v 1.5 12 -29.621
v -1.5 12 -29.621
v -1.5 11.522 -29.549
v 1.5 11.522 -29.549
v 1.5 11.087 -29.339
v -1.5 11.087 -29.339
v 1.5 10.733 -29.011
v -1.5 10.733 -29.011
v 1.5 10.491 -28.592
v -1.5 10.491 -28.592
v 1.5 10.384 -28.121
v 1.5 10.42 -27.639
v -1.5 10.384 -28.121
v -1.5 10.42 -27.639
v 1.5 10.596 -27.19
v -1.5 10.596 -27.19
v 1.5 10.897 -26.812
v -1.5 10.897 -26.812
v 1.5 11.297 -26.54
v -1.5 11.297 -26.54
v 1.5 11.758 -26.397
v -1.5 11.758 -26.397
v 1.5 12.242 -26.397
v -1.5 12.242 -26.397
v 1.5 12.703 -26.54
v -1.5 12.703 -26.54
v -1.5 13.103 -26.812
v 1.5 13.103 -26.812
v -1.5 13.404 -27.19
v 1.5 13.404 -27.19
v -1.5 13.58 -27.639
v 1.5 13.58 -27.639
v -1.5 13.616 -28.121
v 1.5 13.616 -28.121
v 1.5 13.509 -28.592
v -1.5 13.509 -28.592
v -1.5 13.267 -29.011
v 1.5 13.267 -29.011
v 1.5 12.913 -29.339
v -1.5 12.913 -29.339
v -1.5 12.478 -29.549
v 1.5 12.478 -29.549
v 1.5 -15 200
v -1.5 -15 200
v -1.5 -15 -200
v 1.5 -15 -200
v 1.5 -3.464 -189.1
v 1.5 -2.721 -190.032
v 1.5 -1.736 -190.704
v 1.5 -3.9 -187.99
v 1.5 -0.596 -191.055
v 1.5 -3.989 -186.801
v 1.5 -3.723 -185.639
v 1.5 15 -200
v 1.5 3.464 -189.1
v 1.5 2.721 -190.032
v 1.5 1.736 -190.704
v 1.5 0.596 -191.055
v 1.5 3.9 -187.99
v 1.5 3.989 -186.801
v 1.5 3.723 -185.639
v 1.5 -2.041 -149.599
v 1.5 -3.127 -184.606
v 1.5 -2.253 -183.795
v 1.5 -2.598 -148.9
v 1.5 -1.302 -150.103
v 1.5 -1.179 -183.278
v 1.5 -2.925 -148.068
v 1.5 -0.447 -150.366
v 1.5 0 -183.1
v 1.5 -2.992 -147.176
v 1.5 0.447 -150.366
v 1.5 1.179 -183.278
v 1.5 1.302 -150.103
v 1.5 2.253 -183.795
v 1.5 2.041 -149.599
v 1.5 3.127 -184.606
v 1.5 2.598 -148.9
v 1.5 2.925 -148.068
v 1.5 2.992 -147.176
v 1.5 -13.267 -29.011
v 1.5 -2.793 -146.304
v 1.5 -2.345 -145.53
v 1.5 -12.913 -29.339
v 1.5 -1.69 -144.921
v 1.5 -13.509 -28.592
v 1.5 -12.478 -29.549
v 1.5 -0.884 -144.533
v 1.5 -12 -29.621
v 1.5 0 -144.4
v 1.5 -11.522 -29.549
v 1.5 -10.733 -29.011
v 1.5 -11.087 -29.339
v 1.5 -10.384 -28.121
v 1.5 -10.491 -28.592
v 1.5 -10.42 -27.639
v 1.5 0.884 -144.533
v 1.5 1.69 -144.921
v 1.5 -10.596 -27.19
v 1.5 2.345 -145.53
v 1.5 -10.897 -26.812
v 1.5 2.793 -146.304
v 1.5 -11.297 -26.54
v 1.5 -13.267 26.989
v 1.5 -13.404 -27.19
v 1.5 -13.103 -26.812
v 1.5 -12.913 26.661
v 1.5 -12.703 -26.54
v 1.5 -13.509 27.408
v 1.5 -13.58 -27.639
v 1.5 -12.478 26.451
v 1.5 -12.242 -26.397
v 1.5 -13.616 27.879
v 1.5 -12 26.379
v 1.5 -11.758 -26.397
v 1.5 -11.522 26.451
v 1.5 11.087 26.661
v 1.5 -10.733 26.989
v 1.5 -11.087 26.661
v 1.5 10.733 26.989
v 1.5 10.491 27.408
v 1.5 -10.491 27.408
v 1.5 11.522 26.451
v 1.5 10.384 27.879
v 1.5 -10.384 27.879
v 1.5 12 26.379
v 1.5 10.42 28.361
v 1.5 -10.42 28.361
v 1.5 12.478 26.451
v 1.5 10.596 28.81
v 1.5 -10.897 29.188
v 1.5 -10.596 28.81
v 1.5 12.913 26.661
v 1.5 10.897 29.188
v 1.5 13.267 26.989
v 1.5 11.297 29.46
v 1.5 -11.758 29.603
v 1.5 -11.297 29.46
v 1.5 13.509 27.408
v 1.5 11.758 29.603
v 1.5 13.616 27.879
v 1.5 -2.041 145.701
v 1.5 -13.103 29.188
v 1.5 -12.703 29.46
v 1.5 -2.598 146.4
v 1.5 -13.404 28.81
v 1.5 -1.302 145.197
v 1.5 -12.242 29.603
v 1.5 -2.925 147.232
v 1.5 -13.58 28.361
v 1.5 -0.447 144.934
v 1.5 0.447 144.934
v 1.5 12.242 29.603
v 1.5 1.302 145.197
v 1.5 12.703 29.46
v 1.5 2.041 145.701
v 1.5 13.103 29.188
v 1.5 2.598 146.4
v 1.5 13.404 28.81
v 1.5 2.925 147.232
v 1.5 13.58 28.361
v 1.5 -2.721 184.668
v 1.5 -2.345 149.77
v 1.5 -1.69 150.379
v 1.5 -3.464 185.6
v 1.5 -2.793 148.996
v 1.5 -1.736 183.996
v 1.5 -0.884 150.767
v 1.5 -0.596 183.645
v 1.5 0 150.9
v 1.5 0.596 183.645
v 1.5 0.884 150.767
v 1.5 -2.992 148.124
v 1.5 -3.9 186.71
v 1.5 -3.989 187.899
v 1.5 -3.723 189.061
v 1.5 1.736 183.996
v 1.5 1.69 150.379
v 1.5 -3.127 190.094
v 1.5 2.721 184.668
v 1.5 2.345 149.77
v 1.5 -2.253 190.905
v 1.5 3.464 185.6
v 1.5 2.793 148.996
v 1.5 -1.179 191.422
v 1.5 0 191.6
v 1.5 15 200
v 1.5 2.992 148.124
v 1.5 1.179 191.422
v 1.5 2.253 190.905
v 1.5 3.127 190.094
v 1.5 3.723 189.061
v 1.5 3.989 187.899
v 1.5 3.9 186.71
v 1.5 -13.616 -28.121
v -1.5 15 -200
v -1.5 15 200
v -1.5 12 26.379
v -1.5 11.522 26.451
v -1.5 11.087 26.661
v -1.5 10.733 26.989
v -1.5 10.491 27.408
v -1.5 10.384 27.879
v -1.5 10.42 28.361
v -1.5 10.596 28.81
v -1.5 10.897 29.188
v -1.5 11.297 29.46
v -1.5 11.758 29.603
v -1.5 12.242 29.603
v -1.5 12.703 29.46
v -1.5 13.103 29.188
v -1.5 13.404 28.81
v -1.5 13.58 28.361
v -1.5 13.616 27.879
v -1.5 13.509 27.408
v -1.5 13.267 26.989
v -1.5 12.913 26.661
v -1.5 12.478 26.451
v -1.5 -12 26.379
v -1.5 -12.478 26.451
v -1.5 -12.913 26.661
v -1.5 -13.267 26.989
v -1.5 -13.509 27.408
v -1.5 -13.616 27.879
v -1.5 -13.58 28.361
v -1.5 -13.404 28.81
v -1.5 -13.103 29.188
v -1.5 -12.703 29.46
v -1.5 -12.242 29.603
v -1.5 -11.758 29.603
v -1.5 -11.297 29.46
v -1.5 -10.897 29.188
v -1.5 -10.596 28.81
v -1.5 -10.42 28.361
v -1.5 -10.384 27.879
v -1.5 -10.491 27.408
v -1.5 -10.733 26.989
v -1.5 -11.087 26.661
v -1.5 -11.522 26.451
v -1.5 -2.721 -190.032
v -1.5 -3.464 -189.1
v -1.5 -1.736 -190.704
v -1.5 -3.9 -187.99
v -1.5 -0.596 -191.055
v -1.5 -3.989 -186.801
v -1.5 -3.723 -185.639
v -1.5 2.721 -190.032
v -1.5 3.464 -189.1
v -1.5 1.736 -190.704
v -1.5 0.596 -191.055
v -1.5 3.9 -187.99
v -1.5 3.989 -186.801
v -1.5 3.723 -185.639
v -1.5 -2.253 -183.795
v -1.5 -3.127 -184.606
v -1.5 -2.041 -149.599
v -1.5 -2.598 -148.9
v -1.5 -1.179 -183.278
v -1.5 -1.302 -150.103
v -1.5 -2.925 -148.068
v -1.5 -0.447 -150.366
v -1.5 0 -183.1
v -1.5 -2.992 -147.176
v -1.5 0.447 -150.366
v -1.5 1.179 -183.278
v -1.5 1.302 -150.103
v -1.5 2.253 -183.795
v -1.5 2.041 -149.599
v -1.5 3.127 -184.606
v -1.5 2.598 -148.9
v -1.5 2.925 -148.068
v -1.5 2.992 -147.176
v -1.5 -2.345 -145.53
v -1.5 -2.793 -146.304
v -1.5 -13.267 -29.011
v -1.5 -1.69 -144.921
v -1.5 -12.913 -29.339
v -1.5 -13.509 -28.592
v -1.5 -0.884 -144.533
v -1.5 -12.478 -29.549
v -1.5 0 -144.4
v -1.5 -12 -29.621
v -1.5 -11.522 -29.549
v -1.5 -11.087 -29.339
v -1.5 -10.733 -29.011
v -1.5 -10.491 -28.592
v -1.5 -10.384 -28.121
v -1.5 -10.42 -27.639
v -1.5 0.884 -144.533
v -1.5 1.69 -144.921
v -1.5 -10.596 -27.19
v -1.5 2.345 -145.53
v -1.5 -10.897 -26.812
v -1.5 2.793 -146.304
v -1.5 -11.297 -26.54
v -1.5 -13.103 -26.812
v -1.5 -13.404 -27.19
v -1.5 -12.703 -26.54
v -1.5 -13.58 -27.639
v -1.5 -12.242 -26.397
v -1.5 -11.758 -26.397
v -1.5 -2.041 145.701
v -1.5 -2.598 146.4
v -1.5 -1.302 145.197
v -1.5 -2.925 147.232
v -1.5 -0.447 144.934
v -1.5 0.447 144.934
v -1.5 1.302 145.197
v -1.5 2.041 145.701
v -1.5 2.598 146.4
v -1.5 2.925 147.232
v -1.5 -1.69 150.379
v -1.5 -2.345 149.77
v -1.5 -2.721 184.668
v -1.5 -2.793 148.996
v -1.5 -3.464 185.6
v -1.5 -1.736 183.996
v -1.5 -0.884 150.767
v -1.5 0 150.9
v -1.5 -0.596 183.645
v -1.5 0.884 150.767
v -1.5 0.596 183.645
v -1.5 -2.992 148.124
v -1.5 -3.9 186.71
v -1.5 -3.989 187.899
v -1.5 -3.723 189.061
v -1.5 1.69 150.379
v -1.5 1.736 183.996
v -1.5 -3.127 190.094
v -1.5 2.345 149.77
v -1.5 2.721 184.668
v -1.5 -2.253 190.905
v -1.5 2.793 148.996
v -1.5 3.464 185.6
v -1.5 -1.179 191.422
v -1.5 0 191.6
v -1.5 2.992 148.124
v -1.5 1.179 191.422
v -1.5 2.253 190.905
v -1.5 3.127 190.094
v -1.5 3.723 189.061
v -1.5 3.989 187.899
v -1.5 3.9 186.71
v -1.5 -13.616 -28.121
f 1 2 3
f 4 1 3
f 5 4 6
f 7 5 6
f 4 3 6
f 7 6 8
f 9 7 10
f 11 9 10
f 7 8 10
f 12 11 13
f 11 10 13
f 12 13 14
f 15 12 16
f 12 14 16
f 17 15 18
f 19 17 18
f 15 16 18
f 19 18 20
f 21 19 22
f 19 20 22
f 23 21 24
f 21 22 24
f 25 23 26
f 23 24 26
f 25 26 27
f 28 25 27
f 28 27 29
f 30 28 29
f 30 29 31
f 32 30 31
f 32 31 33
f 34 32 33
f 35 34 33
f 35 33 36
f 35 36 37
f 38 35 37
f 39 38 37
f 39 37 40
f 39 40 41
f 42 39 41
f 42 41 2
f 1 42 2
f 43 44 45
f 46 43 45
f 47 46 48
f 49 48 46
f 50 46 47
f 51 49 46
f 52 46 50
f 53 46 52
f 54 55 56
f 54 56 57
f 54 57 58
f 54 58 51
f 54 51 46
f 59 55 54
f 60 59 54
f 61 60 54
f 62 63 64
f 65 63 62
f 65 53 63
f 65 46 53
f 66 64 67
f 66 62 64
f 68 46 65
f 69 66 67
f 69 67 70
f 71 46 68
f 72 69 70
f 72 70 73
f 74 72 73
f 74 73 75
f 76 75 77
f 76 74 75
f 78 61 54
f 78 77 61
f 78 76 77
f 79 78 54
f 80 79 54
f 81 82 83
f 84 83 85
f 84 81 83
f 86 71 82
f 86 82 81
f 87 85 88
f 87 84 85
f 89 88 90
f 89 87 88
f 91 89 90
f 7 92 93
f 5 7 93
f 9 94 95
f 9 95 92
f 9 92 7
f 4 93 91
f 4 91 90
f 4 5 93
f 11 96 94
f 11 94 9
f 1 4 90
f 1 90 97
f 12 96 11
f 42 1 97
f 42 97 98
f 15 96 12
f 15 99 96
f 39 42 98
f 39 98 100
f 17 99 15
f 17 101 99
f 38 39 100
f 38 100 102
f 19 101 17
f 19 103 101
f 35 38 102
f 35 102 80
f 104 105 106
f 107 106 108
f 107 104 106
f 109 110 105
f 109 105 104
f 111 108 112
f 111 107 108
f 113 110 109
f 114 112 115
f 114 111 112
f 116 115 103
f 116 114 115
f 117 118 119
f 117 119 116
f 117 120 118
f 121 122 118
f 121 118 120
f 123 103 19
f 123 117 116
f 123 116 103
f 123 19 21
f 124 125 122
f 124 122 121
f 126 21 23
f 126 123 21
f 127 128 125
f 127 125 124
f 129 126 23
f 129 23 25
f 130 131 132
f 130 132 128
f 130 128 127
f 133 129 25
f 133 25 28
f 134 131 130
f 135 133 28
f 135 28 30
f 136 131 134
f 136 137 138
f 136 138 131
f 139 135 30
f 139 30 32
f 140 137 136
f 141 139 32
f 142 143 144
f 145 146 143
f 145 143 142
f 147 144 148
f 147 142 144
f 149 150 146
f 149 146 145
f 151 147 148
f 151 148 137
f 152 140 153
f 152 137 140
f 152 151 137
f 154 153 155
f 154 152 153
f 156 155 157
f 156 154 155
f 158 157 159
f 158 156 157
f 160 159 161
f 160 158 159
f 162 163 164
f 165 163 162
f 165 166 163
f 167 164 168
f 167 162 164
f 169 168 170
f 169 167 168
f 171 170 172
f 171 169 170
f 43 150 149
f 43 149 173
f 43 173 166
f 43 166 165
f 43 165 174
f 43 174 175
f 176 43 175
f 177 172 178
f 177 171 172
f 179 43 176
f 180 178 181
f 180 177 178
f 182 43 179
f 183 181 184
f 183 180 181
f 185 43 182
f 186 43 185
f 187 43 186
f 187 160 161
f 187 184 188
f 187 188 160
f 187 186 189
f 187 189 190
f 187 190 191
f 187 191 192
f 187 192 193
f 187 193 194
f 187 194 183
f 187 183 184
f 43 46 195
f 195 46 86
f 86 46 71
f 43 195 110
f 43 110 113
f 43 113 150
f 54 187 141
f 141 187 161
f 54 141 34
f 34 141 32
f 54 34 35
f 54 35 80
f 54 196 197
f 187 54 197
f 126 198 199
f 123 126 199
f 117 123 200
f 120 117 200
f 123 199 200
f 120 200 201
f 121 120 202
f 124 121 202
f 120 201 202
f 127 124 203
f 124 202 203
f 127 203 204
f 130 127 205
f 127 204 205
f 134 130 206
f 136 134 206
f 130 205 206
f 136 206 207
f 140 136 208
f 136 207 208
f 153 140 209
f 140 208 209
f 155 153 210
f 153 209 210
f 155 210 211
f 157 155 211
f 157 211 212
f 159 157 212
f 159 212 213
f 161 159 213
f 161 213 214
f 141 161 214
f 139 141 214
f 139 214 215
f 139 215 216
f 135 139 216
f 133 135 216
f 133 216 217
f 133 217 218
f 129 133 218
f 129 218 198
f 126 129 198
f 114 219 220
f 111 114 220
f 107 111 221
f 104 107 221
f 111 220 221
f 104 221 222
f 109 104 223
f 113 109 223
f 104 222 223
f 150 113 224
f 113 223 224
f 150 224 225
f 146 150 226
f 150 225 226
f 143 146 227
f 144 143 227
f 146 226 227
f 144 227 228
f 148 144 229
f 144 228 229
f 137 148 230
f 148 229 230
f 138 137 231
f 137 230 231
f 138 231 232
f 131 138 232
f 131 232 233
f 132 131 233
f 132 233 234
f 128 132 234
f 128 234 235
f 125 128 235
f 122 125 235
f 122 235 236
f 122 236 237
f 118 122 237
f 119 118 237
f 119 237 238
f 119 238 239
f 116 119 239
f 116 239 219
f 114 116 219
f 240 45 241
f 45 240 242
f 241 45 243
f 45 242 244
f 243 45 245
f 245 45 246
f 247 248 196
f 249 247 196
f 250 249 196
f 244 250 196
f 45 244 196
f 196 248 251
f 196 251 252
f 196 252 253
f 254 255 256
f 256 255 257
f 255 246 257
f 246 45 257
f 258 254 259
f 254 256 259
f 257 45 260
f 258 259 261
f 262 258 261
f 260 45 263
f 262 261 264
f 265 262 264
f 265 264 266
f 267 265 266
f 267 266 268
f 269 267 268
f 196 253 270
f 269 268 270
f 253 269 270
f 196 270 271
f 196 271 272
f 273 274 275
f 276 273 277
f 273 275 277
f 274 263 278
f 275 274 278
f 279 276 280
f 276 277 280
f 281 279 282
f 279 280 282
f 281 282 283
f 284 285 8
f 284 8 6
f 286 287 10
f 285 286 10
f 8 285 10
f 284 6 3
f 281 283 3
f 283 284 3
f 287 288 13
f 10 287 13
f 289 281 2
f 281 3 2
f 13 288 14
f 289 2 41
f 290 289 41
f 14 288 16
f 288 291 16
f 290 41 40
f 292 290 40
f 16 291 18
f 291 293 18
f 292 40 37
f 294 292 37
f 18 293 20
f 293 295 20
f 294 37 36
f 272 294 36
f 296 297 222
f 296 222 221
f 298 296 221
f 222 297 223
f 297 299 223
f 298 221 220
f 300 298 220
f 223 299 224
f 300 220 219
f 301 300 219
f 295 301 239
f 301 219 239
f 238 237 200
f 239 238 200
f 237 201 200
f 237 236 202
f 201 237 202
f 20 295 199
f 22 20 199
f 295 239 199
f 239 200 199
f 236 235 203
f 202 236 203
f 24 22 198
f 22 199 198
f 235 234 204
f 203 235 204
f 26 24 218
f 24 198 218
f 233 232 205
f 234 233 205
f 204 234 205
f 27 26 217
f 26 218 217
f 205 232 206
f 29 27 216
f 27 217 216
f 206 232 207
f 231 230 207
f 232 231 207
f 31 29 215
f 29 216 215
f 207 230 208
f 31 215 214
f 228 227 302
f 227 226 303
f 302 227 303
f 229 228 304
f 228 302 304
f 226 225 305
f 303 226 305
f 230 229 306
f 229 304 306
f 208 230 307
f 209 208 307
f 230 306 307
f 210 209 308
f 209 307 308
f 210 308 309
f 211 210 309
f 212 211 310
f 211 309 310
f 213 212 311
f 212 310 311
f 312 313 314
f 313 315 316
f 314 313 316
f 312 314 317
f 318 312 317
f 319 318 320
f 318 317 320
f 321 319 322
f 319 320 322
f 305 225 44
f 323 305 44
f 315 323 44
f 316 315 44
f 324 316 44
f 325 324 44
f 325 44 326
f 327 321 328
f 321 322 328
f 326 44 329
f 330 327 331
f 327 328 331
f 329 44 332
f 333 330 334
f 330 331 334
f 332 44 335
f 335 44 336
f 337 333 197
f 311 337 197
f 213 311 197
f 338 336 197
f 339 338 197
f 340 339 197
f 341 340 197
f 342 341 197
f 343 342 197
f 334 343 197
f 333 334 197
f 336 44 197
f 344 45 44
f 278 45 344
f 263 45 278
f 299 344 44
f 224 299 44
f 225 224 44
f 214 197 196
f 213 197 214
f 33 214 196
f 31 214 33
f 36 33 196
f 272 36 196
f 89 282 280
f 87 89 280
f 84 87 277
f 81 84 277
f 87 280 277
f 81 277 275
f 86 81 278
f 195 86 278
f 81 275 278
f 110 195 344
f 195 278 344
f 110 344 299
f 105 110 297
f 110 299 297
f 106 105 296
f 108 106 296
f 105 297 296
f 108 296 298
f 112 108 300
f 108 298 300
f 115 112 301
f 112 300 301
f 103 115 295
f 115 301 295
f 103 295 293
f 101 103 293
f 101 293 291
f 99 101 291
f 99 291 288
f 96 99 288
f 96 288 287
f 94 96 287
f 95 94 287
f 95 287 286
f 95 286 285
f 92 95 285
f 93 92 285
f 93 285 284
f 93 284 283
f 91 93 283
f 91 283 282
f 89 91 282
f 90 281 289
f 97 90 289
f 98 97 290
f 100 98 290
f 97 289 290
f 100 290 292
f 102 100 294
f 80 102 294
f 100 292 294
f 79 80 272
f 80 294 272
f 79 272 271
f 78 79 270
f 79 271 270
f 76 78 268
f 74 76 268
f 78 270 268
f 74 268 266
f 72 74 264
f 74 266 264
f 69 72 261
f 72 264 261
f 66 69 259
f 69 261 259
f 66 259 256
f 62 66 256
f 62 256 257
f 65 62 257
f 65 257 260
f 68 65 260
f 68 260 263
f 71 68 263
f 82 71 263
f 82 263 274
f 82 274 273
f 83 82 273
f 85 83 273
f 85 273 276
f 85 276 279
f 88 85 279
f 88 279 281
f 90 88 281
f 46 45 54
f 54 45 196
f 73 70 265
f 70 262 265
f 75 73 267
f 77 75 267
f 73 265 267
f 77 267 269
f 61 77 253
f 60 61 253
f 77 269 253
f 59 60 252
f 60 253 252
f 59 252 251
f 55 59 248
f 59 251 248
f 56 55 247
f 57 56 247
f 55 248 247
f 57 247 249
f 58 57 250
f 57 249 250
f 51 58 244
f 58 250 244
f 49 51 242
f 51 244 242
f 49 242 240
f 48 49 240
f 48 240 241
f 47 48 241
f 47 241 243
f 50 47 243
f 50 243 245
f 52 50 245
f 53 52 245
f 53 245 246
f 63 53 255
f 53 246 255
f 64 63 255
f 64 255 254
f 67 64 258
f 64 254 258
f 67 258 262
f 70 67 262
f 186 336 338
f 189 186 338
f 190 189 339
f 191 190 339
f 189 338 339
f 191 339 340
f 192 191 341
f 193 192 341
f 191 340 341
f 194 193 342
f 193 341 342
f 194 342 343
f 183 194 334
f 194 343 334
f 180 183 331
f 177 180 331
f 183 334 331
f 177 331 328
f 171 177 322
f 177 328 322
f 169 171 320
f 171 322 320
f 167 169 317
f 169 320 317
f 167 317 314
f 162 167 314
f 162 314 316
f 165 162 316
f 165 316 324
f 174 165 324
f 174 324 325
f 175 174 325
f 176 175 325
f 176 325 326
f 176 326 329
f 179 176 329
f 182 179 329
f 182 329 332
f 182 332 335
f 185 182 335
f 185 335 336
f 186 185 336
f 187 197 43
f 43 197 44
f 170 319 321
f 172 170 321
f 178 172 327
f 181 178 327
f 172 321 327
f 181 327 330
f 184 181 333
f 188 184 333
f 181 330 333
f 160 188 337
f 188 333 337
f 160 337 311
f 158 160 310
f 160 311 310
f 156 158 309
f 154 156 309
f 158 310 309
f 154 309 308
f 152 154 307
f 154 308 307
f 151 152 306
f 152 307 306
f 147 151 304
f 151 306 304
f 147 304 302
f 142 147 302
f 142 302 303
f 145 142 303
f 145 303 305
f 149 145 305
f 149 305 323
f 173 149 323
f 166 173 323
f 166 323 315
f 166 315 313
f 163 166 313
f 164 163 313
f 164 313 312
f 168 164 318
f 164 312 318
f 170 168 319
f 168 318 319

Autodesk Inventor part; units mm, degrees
ref_plane "YZ Plane" through (0, 0, 0) normal (1, 0, 0) x (0, 1, 0)
ref_plane "XZ Plane" through (0, 0, 0) normal (0, 1, 0) x (-1, 0, 0)
ref_plane "XY Plane" through (0, 0, 0) normal (0, 0, 1) x (1, 0, 0)
sketch "Sketch2" plane through (-1.5, 0, 0) normal (-1, 0, 0) x (0, 0, 1)
  circle A0 centre (177.25, 0.2229) radius 2.55 projected
  circle A1 centre (157.25, 0.2229) radius 2.55 projected
  point P0 (0, 0)
sketch "Sketch1" plane through (0, 0, 0) normal (1, 0, 0) x (0, 1, 0)
  line L0 (15, 200) -> (-15, 200)
  line L1 (-15, 200) -> (-15, -200)
  line L2 (-15, -200) -> (15, -200)
  line L3 (15, -200) -> (15, 200)
  line L4 (15, 200) -> (-15, -200) construction
  line L5 (-15, 200) -> (15, -200) construction
  point P0 (0, 0)
  point P1 (0, 0)
  dimension "d0" = 400
  dimension "d1" = 30
extrude "Plate1" add sketch "Sketch1" along normal mid plane 3
sketch "Sketch3" plane through (-1.5, 0, 0) normal (-1, 0, 0) x (0, 0, 1)
  circle A0 centre (187.6, 0) radius 4
  circle A1 centre (147.9, 0) radius 3
  circle A2 centre (-147.4, 0) radius 3
  circle A3 centre (-187.1, 0) radius 4
  line L0 (200, 15) -> (200, -15) projected
  line L1 (-200, -15) -> (-200, 15) projected
  line L2 (200, -15) -> (-200, -15) projected
  point P0 (0, 0)
  dimension "d7" = 12.4
  dimension "d8" = 8
  dimension "d9" = 39.7
  dimension "d10" = 6
  dimension "d22" = 8
  dimension "d23" = 6
  dimension "d24" = 12.9
  dimension "d26" = 15
  dimension "d27" = 39.7
extrude "Cut2" cut sketch "Sketch3" against normal blind 3
sketch "Sketch4" plane through (1.5, 0, 0) normal (1, 0, 0) x (0, 0, -1)
  line L0 (-200, 15) -> (200, 15) projected
  point P0 (0, 0)
  point P1 (-28, 12)
  point P2 (-28, -12)
  point P3 (28, 12)
  point P4 (28, -12)
  dimension "d11" = 56
  dimension "d12" = 24
  dimension "d13" = 3
  dimension "d14" = 28
hole "Hole1" at (1.5, 12, 28) at (1.5, -12, 28) at (1.5, 12, -28) at (1.5, -12, -28) direction (-1, 0, 0) diameter 3.242 depth 11.8 tip angle 118 thread size "M4x0.7" class "6H" standard "ISO Metric profile"
equation "\"d27\" = d9"
equation "\"d5\" = Thickness"
equation "\"d2\" = Thickness"
equation "\"BendRadius\" = Thickness"
equation "\"BendReliefWidth\" = Thickness"
equation "\"BendReliefDepth\" = 0.5 * Thickness"
equation "\"CornerReliefSize\" = 4 * Thickness"
equation "\"MinimumRemnant\" = 2 * Thickness"
equation "\"TransitionRadius\" = BendRadius"
equation "\"JacobiRadiusSize\" = BendRadius"
equation "\"GapSize\" = Thickness"
equation "\"Thickness\" = 3"
properties part number "HCMUTE-CDT23-OP_DVCAM" material "PMMA Plastic"
